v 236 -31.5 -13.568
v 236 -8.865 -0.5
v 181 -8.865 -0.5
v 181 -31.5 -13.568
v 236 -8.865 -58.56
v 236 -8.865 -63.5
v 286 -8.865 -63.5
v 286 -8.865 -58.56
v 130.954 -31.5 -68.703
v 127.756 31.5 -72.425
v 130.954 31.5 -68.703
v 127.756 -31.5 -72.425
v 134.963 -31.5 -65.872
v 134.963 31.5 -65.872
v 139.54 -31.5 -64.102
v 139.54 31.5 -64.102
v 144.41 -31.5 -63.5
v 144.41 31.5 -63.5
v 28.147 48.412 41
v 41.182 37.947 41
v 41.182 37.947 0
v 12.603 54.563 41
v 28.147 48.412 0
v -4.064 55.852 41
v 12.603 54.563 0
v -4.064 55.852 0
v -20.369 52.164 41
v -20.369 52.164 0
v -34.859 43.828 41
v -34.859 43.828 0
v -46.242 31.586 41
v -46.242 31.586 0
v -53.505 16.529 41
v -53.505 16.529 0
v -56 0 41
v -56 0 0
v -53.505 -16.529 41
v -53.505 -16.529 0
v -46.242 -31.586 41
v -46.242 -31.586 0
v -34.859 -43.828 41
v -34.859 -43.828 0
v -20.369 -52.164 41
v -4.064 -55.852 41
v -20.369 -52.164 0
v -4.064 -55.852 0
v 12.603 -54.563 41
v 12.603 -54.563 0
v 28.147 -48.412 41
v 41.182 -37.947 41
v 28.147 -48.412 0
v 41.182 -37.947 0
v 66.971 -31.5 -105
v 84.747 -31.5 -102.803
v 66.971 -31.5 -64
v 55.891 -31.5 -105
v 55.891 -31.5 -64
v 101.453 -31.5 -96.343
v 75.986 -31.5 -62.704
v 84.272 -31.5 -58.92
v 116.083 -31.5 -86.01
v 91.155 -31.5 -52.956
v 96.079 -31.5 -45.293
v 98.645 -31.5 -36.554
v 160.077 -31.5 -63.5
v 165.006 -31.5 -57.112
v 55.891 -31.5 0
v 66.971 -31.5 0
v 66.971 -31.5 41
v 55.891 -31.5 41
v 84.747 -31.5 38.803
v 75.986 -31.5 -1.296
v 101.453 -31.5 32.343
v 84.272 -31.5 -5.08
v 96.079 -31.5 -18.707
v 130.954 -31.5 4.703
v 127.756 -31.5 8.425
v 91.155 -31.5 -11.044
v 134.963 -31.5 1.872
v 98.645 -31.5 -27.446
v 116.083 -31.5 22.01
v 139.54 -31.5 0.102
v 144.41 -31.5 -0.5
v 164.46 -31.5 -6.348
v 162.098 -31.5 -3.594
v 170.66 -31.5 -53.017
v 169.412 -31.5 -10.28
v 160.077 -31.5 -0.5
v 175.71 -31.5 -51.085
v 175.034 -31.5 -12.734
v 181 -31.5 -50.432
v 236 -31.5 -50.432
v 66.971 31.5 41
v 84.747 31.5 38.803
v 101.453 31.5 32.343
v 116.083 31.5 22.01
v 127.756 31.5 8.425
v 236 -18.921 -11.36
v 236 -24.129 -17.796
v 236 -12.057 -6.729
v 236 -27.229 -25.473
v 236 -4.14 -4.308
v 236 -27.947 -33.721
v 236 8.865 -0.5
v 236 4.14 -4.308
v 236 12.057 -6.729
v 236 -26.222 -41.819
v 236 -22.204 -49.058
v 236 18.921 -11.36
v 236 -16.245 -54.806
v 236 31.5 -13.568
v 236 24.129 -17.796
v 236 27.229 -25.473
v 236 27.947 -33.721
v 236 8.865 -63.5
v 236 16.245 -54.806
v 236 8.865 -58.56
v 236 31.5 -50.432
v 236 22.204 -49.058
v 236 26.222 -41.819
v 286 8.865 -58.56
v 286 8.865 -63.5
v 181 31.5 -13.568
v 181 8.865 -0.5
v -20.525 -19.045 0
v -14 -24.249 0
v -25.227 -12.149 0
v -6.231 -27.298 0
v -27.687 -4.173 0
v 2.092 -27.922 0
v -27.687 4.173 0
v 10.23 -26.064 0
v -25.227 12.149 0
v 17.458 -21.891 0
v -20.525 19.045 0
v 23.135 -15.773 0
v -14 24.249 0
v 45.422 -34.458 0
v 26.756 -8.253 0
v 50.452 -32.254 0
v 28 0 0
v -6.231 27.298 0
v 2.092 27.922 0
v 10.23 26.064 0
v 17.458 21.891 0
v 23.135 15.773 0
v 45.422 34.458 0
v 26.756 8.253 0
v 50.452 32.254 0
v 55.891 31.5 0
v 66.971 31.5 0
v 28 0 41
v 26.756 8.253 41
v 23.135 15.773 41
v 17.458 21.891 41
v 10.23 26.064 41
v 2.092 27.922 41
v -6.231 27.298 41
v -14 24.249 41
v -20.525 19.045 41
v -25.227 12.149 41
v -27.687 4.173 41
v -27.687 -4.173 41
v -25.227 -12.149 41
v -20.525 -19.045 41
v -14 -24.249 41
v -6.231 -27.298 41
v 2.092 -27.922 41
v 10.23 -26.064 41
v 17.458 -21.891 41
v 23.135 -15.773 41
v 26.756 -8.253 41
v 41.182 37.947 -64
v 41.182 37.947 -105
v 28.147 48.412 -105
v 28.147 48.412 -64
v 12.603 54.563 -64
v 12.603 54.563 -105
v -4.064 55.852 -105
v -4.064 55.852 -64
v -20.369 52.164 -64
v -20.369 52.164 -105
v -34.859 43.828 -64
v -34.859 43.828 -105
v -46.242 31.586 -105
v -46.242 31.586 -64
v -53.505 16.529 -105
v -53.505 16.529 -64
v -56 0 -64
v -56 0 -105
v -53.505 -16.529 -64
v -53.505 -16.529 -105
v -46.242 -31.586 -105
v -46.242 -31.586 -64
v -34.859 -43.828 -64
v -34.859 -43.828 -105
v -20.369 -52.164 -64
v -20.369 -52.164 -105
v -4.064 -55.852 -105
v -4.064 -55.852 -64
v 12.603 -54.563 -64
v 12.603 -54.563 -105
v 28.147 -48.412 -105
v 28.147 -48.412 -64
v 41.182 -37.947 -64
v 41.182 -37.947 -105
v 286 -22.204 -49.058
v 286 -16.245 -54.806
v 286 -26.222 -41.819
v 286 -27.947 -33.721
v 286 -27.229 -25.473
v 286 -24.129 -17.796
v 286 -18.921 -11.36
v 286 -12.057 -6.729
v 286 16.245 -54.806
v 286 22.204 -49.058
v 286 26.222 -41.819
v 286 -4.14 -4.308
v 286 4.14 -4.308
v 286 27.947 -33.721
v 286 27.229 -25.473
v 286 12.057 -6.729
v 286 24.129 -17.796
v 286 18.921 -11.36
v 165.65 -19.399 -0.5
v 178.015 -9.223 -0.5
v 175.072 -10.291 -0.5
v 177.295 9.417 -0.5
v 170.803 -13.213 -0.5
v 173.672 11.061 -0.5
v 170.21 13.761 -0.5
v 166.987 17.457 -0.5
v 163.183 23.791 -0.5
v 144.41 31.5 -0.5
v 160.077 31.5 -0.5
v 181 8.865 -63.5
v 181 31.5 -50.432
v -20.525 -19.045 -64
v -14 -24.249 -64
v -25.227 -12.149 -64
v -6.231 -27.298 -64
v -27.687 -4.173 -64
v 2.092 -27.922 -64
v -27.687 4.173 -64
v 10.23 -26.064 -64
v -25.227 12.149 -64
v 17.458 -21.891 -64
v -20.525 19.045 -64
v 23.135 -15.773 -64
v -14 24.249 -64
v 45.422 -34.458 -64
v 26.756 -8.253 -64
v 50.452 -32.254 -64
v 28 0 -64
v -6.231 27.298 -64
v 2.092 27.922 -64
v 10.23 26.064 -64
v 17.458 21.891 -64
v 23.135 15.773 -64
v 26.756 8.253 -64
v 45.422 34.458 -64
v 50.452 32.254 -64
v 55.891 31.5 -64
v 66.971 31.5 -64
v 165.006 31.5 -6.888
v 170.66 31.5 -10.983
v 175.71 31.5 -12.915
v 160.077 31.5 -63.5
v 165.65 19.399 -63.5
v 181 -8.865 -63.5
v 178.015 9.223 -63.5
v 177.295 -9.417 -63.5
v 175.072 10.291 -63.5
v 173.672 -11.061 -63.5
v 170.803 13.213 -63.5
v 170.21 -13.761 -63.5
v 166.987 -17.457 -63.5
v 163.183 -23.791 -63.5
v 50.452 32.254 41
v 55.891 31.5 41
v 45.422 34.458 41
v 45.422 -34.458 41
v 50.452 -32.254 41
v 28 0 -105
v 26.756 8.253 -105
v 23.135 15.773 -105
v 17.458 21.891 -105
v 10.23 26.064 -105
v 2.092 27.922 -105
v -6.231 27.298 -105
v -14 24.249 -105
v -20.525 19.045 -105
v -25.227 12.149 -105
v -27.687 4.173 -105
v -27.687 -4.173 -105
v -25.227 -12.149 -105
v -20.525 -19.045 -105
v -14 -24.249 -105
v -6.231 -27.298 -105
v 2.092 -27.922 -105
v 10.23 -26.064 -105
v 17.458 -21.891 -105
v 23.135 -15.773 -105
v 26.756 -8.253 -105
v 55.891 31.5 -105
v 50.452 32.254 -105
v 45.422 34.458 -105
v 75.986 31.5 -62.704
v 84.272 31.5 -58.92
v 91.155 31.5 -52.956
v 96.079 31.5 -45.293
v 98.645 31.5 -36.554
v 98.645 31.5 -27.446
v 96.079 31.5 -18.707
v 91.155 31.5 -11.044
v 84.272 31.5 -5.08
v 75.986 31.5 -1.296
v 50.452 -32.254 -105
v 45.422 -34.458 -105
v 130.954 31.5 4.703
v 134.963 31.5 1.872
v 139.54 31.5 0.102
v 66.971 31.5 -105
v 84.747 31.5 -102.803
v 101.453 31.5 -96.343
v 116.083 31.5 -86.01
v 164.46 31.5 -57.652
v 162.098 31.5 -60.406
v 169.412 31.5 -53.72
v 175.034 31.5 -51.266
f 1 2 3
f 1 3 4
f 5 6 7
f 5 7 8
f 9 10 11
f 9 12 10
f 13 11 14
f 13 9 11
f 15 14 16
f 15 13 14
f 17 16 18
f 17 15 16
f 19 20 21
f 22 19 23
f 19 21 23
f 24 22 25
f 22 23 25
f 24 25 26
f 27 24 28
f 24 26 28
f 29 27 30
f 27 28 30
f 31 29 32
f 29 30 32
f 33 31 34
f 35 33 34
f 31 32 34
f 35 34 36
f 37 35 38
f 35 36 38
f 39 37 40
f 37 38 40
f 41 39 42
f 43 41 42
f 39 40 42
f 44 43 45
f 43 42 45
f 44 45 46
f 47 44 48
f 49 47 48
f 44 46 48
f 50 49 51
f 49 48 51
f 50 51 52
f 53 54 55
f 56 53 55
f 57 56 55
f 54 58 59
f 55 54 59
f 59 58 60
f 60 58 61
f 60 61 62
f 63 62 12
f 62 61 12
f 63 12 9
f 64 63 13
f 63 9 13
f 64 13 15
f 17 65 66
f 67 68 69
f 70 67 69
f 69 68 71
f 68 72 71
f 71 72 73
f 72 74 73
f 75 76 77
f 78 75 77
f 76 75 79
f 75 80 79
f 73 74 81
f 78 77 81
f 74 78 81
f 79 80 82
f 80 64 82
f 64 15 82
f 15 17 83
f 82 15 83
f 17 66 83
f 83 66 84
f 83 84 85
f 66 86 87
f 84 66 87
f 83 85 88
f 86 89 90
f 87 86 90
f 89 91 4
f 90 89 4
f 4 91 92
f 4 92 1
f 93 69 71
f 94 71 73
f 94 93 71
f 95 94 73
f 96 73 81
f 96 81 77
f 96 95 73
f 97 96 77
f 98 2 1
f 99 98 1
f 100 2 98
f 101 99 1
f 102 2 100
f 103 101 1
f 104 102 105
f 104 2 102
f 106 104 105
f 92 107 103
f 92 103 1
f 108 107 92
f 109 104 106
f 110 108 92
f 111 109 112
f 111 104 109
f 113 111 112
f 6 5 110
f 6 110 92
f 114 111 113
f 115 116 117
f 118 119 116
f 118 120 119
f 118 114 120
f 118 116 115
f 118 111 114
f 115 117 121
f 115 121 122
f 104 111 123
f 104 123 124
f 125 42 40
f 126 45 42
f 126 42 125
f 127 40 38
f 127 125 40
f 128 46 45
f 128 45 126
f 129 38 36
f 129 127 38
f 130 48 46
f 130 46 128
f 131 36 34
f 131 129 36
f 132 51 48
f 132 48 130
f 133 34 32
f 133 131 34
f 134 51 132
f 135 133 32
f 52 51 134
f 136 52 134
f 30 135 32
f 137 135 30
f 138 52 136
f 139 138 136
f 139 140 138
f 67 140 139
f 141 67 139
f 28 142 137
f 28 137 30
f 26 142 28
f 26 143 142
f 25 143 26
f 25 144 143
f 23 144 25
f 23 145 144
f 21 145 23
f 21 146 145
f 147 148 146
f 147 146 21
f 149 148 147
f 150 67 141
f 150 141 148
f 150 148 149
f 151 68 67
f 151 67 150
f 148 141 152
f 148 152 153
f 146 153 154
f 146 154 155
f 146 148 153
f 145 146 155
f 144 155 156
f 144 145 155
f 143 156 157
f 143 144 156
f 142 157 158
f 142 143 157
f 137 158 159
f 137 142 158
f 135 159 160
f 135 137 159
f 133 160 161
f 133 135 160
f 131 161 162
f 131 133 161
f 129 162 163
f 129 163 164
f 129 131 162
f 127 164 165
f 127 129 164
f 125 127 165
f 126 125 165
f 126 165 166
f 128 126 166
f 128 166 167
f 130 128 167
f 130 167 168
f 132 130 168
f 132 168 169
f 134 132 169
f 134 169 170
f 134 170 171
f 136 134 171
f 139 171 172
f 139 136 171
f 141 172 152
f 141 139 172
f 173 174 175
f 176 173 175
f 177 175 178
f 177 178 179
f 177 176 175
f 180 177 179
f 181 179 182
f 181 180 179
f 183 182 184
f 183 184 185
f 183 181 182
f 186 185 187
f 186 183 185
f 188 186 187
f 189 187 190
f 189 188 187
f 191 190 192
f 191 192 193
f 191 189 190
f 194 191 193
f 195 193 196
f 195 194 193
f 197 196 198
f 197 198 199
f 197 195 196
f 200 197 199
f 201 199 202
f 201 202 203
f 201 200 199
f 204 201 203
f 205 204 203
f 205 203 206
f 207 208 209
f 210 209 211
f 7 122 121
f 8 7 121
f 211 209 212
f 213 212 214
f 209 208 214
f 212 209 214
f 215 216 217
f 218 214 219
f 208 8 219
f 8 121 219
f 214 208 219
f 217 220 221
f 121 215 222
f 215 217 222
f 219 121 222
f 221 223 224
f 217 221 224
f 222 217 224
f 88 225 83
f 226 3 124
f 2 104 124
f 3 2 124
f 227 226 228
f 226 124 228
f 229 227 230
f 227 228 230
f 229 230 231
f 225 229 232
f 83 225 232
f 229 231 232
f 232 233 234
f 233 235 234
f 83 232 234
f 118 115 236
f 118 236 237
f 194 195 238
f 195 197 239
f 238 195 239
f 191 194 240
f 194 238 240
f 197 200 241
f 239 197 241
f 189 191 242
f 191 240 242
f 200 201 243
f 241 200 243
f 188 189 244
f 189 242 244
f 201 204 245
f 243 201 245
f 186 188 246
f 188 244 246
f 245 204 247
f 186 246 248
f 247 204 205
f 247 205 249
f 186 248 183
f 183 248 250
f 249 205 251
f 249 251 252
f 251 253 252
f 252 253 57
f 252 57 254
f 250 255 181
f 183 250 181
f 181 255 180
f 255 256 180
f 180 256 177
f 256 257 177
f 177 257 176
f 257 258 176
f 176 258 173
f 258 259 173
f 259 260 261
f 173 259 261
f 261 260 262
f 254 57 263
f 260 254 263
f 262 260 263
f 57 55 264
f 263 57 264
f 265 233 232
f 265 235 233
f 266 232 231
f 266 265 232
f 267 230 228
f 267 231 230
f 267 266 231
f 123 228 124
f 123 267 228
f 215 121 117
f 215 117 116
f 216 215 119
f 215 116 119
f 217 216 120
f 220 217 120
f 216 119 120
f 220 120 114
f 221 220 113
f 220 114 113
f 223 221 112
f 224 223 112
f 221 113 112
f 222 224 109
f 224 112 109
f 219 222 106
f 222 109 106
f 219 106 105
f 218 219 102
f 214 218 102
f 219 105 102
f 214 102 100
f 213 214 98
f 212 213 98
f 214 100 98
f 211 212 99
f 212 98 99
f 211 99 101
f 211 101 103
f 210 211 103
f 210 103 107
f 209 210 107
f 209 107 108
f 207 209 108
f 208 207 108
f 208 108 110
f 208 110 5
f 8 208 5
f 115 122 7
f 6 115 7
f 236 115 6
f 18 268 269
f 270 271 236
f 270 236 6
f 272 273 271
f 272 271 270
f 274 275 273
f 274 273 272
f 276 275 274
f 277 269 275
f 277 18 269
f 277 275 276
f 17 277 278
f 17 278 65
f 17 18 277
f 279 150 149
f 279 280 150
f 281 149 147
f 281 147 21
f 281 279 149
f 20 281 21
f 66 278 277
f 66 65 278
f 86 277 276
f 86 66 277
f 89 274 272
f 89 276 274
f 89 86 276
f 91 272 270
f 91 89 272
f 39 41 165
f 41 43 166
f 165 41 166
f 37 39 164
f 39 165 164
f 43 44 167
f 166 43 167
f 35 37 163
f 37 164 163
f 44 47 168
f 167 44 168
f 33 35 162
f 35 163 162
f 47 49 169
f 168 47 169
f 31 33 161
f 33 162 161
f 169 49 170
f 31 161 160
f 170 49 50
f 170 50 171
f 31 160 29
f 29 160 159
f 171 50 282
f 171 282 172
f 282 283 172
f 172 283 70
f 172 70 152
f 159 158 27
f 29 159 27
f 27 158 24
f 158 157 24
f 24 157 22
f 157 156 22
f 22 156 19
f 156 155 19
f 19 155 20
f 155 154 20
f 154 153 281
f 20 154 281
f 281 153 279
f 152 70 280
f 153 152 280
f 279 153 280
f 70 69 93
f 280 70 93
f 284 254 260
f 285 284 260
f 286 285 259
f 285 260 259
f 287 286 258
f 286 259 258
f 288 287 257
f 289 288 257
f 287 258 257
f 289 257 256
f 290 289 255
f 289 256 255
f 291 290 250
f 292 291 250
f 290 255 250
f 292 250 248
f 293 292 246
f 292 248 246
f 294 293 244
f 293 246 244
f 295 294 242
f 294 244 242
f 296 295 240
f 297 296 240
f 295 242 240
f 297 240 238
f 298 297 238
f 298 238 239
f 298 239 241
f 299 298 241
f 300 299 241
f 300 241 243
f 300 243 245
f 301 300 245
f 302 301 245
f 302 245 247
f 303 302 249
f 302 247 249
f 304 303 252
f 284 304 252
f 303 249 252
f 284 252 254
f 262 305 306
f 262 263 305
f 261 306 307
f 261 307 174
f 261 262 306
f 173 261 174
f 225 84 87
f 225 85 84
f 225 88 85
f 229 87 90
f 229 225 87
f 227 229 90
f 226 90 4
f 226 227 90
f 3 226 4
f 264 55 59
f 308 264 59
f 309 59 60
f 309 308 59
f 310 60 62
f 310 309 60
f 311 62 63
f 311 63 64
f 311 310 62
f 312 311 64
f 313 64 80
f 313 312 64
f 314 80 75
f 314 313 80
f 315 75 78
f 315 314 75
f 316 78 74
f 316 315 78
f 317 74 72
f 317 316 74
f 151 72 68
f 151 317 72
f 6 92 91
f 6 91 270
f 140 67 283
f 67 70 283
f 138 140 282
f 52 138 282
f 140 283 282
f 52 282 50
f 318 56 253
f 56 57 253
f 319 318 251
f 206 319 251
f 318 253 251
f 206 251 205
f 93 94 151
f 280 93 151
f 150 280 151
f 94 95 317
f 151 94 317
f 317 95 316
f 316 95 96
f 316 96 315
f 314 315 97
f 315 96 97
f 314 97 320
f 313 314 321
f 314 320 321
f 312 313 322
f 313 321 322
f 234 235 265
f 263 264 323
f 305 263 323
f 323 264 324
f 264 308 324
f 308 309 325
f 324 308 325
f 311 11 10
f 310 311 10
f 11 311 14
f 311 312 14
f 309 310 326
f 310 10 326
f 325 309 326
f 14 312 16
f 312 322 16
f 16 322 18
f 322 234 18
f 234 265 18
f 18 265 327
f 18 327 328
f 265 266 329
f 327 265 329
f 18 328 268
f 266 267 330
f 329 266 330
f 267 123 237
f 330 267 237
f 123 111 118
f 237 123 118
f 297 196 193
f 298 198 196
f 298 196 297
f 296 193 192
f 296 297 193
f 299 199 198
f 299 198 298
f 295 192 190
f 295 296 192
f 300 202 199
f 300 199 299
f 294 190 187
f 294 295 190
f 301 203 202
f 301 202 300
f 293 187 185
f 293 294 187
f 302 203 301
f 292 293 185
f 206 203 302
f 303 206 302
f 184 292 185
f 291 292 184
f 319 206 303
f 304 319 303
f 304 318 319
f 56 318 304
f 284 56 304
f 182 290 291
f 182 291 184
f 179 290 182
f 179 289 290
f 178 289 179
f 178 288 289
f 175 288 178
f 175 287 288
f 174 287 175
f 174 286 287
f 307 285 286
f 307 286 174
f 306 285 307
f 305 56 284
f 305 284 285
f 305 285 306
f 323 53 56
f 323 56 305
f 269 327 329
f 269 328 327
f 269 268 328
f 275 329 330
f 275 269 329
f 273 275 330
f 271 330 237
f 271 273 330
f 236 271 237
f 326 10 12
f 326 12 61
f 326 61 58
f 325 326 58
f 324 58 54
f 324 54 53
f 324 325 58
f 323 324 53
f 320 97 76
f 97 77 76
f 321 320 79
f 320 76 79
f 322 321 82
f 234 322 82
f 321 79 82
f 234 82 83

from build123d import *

# Parameters (mm, degrees)
SKETCH2_R                = 56
SKETCH2_R_2              = 28
BOSS_EXTRUDE1_DEPTH      = 41
BOSS_EXTRUDE2_DEPTH      = 31.5
BOSS_EXTRUDE3_REACH      = 173.122
BOSS_EXTRUDE3_END_RADIUS = 56
SKETCH4_W                = 41
SKETCH4_H                = 63
FILLET1_R                = 20
BOSS_EXTRUDE4_REACH      = 317.317
BOSS_EXTRUDE4_END_RADIUS = 73
SKETCH6_W                = 63
SKETCH6_H                = 63
FILLET2_R                = 20
SKETCH7_R                = 28
BOSS_EXTRUDE5_DEPTH      = 50
SKETCH8_R                = 50
CUT_EXTRUDE1_DEPTH       = 80
FILLET3_R                = 25
BOSS_EXTRUDE6_DEPTH      = 50


with BuildPart() as part:
    # Sketch2 → Boss-Extrude1 (new body)
    with BuildSketch(Plane.XY):
        Circle(SKETCH2_R)
        Circle(SKETCH2_R_2, mode=Mode.SUBTRACT)
    extrude(amount=BOSS_EXTRUDE1_DEPTH)


with BuildPart() as body_2:
    # Mirror4: mirrored copy
    add(part.part.mirror(Plane(origin=(0, 0, -32), x_dir=(1, 0, 0), z_dir=(0, 0, -1))))


with BuildPart() as body_3:
    # Sketch3 → Boss-Extrude2 (new, symmetric)
    with BuildSketch(Plane(origin=(0, 0, 0), x_dir=(1, 0, 0), z_dir=(0, 1, 0))):
        with BuildLine():
            Line((66.971041272, 105), (66.971041272, 64))
            ThreePointArc((66.971041272, 64), (98.971041272, 32), (66.971041272, 0))
            Line((66.971041272, 0), (66.971041272, -41))
            ThreePointArc((66.971041272, -41), (139.971041272, 32), (66.971041272, 105))
        make_face()
    extrude(amount=BOSS_EXTRUDE2_DEPTH, both=True)


with BuildPart() as part_1:
    add(part.part)

    add(body_2.part)  # Boss-Extrude3 merges body 2

    add(body_3.part)  # Boss-Extrude3 merges body 3
    # Boss-Extrude3: up to this cylinder (the profile starts outside it)
    boss_extrude3_end = Plane(origin=(0, 0, -32), z_dir=(0, 0, 1)) * Cylinder(BOSS_EXTRUDE3_END_RADIUS, 564.244, mode=Mode.PRIVATE)
    # Sketch4 → Boss-Extrude3 (add, up to the surface)
    with BuildSketch(Plane.ZY.offset(-66.971041272), mode=Mode.PRIVATE) as boss_extrude3_sk1:
        with Locations((20.5, 0)):
            Rectangle(SKETCH4_W, SKETCH4_H)
    boss_extrude3_tool1 = extrude(boss_extrude3_sk1.sketch, amount=BOSS_EXTRUDE3_REACH, mode=Mode.PRIVATE) - boss_extrude3_end
    add(boss_extrude3_tool1.solids().sort_by_distance((66.971041, 0, 20.5))[0])
    # Sketch4 → Boss-Extrude3 (add, up to the surface)
    with BuildSketch(Plane.ZY.offset(-66.971041272), mode=Mode.PRIVATE) as boss_extrude3_sk2:
        with Locations((-84.5, 0)):
            Rectangle(SKETCH4_W, SKETCH4_H)
    boss_extrude3_tool2 = extrude(boss_extrude3_sk2.sketch, amount=BOSS_EXTRUDE3_REACH, mode=Mode.PRIVATE) - boss_extrude3_end
    add(boss_extrude3_tool2.solids().sort_by_distance((66.971041, 0, -84.5))[0])

    # Fillet1
    fillet1_edges = [part_1.edges().sort_by_distance(p)[0] for p in [
        (46.300647944, 31.5, 20.5),
        (46.300647944, -31.5, 20.5),
        (46.300647944, -31.5, -84.5),
        (46.300647944, 31.5, -84.5),
    ]]
    fillet(fillet1_edges, radius=FILLET1_R)

    # Boss-Extrude4: up to this cylinder (the profile starts outside it)
    boss_extrude4_end = Plane(origin=(66.971041272, 0, -32), z_dir=(0, -1, 0)) * Cylinder(BOSS_EXTRUDE4_END_RADIUS, 781.634, mode=Mode.PRIVATE)
    # Sketch6 → Boss-Extrude4 (add, up to the surface)
    with BuildSketch(Plane(origin=(236, 0, 0), x_dir=(0, 0, -1), z_dir=(1, 0, 0)), mode=Mode.PRIVATE) as boss_extrude4_sk1:
        with Locations((32, 0)):
            Rectangle(SKETCH6_W, SKETCH6_H)
    boss_extrude4_tool1 = extrude(boss_extrude4_sk1.sketch, amount=-BOSS_EXTRUDE4_REACH, mode=Mode.PRIVATE) - boss_extrude4_end
    add(boss_extrude4_tool1.solids().sort_by_distance((236, 0, -32))[0])

    # Fillet2
    fillet2_edges = [part_1.edges().sort_by_distance(p)[0] for p in [
        (132.825046465, 0, -0.5),
        (132.825046465, 0, -63.5),
    ]]
    fillet(fillet2_edges, radius=FILLET2_R)

    # Sketch7 → Boss-Extrude5 (add)
    with BuildSketch(Plane(origin=(236, 0, 0), x_dir=(0, 0, -1), z_dir=(1, 0, 0))):
        with Locations((32, 0)):
            Circle(SKETCH7_R)
    extrude(amount=BOSS_EXTRUDE5_DEPTH)

    # Sketch8 → Cut-Extrude1 (cut)
    with BuildSketch(Plane(origin=(236, 0, 0), x_dir=(0, 0, -1), z_dir=(1, 0, 0))):
        with Locations((32, 0)):
            Circle(SKETCH8_R)
        Polygon((68.618122977, 0), (50.309061489, 31.712224737), (13.690938511, 31.712224737), (-4.618122977, 0), (13.690938511, -31.712224737), (50.309061489, -31.712224737), align=None, mode=Mode.SUBTRACT)
    extrude(amount=-CUT_EXTRUDE1_DEPTH, mode=Mode.SUBTRACT)

    # Fillet3
    # the kernel refuses this fillet: 25 mm, written as the material it adds along each edge
    with BuildSketch(Plane(origin=(156, -45.2617387, -94.75), x_dir=(0, 0.5000000000000009, -0.866025403784438), z_dir=(0, 0.8660254037844382, 0.500000000000001))) as fillet3_piece_1_section:
        with BuildLine():
            CenterArc((FILLET3_R, -FILLET3_R), FILLET3_R, 90, 90)
            Line((0, -FILLET3_R), (0, 0))
            Line((0, 0), (FILLET3_R, 0))
        make_face()
    fillet3_piece_1 = extrude(amount=151.136821004, mode=Mode.PRIVATE)
    fillet3_piece_1 = split(fillet3_piece_1, bisect_by=Plane(origin=(163.326286351, 23.024042198, -63.5), z_dir=(0, 0, 1)), keep=Keep.TOP, mode=Mode.PRIVATE)
    fillet3_piece_1 = split(fillet3_piece_1, bisect_by=Plane(origin=(163.326286351, 31.5, -58.606403481), z_dir=(0, -1, 0)), keep=Keep.TOP, mode=Mode.PRIVATE)
    add(fillet3_piece_1)
    with BuildSketch(Plane(origin=(156, -85.626587737, -19.181589498), x_dir=(0, -0.49999999999999484, -0.8660254037844416), z_dir=(0, 0.8660254037844417, -0.49999999999999484))) as fillet3_piece_2_section:
        with BuildLine():
            CenterArc((FILLET3_R, -FILLET3_R), FILLET3_R, 90, 90)
            Line((0, -FILLET3_R), (0, 0))
            Line((0, 0), (FILLET3_R, 0))
        make_face()
    fillet3_piece_2 = extrude(amount=151.136821004, mode=Mode.PRIVATE)
    fillet3_piece_2 = split(fillet3_piece_2, bisect_by=Plane(origin=(163.326286351, -31.5, -58.606403481), z_dir=(0, 1, 0)), keep=Keep.TOP, mode=Mode.PRIVATE)
    fillet3_piece_2 = split(fillet3_piece_2, bisect_by=Plane(origin=(163.326286351, -23.024042198, -63.5), z_dir=(0, 0, 1)), keep=Keep.TOP, mode=Mode.PRIVATE)
    add(fillet3_piece_2)
    with BuildSketch(Plane(origin=(156, 85.626587737, -44.818410502), x_dir=(1, 0, 0), z_dir=(0, -0.8660254037844416, 0.49999999999999506))) as fillet3_piece_3_section:
        with BuildLine():
            CenterArc((FILLET3_R, FILLET3_R), FILLET3_R, 180, 90)
            Line((0, FILLET3_R), (0, 0))
            Line((0, 0), (FILLET3_R, 0))
        make_face()
    fillet3_piece_3 = extrude(amount=151.136821004, mode=Mode.PRIVATE)
    fillet3_piece_3 = split(fillet3_piece_3, bisect_by=Plane(origin=(163.326286352, 23.024042197, -0.5), z_dir=(0, 0, -1)), keep=Keep.TOP, mode=Mode.PRIVATE)
    fillet3_piece_3 = split(fillet3_piece_3, bisect_by=Plane(origin=(163.326286352, 31.5, -5.393596519), z_dir=(0, -1, 0)), keep=Keep.TOP, mode=Mode.PRIVATE)
    add(fillet3_piece_3)
    with BuildSketch(Plane(origin=(156, 45.2617387, 30.75), x_dir=(1, 0, 0), z_dir=(0, -0.8660254037844346, -0.5000000000000071))) as fillet3_piece_4_section:
        with BuildLine():
            CenterArc((FILLET3_R, FILLET3_R), FILLET3_R, 180, 90)
            Line((0, FILLET3_R), (0, 0))
            Line((0, 0), (FILLET3_R, 0))
        make_face()
    fillet3_piece_4 = extrude(amount=151.136821004, mode=Mode.PRIVATE)
    fillet3_piece_4 = split(fillet3_piece_4, bisect_by=Plane(origin=(163.326286352, -31.5, -5.393596519), z_dir=(0, 1, 0)), keep=Keep.TOP, mode=Mode.PRIVATE)
    fillet3_piece_4 = split(fillet3_piece_4, bisect_by=Plane(origin=(163.326286352, -23.024042197, -0.5), z_dir=(0, 0, -1)), keep=Keep.TOP, mode=Mode.PRIVATE)
    add(fillet3_piece_4)

    # Sketch9 → Boss-Extrude6 (add)
    with BuildSketch(Plane(origin=(236, 0, 0), x_dir=(0, 0, -1), z_dir=(1, 0, 0))):
        with BuildLine():
            Line((58.559639523, 8.864849036), (63.5, 8.864849036))
            Line((63.5, 8.864849036), (63.5, -8.864849036))
            Line((63.5, -8.864849036), (58.559639523, -8.864849036))
            ThreePointArc((58.559639523, -8.864849036), (60, 0), (58.559639523, 8.864849036))
        make_face()
    extrude(amount=BOSS_EXTRUDE6_DEPTH)


solid = part_1.part
